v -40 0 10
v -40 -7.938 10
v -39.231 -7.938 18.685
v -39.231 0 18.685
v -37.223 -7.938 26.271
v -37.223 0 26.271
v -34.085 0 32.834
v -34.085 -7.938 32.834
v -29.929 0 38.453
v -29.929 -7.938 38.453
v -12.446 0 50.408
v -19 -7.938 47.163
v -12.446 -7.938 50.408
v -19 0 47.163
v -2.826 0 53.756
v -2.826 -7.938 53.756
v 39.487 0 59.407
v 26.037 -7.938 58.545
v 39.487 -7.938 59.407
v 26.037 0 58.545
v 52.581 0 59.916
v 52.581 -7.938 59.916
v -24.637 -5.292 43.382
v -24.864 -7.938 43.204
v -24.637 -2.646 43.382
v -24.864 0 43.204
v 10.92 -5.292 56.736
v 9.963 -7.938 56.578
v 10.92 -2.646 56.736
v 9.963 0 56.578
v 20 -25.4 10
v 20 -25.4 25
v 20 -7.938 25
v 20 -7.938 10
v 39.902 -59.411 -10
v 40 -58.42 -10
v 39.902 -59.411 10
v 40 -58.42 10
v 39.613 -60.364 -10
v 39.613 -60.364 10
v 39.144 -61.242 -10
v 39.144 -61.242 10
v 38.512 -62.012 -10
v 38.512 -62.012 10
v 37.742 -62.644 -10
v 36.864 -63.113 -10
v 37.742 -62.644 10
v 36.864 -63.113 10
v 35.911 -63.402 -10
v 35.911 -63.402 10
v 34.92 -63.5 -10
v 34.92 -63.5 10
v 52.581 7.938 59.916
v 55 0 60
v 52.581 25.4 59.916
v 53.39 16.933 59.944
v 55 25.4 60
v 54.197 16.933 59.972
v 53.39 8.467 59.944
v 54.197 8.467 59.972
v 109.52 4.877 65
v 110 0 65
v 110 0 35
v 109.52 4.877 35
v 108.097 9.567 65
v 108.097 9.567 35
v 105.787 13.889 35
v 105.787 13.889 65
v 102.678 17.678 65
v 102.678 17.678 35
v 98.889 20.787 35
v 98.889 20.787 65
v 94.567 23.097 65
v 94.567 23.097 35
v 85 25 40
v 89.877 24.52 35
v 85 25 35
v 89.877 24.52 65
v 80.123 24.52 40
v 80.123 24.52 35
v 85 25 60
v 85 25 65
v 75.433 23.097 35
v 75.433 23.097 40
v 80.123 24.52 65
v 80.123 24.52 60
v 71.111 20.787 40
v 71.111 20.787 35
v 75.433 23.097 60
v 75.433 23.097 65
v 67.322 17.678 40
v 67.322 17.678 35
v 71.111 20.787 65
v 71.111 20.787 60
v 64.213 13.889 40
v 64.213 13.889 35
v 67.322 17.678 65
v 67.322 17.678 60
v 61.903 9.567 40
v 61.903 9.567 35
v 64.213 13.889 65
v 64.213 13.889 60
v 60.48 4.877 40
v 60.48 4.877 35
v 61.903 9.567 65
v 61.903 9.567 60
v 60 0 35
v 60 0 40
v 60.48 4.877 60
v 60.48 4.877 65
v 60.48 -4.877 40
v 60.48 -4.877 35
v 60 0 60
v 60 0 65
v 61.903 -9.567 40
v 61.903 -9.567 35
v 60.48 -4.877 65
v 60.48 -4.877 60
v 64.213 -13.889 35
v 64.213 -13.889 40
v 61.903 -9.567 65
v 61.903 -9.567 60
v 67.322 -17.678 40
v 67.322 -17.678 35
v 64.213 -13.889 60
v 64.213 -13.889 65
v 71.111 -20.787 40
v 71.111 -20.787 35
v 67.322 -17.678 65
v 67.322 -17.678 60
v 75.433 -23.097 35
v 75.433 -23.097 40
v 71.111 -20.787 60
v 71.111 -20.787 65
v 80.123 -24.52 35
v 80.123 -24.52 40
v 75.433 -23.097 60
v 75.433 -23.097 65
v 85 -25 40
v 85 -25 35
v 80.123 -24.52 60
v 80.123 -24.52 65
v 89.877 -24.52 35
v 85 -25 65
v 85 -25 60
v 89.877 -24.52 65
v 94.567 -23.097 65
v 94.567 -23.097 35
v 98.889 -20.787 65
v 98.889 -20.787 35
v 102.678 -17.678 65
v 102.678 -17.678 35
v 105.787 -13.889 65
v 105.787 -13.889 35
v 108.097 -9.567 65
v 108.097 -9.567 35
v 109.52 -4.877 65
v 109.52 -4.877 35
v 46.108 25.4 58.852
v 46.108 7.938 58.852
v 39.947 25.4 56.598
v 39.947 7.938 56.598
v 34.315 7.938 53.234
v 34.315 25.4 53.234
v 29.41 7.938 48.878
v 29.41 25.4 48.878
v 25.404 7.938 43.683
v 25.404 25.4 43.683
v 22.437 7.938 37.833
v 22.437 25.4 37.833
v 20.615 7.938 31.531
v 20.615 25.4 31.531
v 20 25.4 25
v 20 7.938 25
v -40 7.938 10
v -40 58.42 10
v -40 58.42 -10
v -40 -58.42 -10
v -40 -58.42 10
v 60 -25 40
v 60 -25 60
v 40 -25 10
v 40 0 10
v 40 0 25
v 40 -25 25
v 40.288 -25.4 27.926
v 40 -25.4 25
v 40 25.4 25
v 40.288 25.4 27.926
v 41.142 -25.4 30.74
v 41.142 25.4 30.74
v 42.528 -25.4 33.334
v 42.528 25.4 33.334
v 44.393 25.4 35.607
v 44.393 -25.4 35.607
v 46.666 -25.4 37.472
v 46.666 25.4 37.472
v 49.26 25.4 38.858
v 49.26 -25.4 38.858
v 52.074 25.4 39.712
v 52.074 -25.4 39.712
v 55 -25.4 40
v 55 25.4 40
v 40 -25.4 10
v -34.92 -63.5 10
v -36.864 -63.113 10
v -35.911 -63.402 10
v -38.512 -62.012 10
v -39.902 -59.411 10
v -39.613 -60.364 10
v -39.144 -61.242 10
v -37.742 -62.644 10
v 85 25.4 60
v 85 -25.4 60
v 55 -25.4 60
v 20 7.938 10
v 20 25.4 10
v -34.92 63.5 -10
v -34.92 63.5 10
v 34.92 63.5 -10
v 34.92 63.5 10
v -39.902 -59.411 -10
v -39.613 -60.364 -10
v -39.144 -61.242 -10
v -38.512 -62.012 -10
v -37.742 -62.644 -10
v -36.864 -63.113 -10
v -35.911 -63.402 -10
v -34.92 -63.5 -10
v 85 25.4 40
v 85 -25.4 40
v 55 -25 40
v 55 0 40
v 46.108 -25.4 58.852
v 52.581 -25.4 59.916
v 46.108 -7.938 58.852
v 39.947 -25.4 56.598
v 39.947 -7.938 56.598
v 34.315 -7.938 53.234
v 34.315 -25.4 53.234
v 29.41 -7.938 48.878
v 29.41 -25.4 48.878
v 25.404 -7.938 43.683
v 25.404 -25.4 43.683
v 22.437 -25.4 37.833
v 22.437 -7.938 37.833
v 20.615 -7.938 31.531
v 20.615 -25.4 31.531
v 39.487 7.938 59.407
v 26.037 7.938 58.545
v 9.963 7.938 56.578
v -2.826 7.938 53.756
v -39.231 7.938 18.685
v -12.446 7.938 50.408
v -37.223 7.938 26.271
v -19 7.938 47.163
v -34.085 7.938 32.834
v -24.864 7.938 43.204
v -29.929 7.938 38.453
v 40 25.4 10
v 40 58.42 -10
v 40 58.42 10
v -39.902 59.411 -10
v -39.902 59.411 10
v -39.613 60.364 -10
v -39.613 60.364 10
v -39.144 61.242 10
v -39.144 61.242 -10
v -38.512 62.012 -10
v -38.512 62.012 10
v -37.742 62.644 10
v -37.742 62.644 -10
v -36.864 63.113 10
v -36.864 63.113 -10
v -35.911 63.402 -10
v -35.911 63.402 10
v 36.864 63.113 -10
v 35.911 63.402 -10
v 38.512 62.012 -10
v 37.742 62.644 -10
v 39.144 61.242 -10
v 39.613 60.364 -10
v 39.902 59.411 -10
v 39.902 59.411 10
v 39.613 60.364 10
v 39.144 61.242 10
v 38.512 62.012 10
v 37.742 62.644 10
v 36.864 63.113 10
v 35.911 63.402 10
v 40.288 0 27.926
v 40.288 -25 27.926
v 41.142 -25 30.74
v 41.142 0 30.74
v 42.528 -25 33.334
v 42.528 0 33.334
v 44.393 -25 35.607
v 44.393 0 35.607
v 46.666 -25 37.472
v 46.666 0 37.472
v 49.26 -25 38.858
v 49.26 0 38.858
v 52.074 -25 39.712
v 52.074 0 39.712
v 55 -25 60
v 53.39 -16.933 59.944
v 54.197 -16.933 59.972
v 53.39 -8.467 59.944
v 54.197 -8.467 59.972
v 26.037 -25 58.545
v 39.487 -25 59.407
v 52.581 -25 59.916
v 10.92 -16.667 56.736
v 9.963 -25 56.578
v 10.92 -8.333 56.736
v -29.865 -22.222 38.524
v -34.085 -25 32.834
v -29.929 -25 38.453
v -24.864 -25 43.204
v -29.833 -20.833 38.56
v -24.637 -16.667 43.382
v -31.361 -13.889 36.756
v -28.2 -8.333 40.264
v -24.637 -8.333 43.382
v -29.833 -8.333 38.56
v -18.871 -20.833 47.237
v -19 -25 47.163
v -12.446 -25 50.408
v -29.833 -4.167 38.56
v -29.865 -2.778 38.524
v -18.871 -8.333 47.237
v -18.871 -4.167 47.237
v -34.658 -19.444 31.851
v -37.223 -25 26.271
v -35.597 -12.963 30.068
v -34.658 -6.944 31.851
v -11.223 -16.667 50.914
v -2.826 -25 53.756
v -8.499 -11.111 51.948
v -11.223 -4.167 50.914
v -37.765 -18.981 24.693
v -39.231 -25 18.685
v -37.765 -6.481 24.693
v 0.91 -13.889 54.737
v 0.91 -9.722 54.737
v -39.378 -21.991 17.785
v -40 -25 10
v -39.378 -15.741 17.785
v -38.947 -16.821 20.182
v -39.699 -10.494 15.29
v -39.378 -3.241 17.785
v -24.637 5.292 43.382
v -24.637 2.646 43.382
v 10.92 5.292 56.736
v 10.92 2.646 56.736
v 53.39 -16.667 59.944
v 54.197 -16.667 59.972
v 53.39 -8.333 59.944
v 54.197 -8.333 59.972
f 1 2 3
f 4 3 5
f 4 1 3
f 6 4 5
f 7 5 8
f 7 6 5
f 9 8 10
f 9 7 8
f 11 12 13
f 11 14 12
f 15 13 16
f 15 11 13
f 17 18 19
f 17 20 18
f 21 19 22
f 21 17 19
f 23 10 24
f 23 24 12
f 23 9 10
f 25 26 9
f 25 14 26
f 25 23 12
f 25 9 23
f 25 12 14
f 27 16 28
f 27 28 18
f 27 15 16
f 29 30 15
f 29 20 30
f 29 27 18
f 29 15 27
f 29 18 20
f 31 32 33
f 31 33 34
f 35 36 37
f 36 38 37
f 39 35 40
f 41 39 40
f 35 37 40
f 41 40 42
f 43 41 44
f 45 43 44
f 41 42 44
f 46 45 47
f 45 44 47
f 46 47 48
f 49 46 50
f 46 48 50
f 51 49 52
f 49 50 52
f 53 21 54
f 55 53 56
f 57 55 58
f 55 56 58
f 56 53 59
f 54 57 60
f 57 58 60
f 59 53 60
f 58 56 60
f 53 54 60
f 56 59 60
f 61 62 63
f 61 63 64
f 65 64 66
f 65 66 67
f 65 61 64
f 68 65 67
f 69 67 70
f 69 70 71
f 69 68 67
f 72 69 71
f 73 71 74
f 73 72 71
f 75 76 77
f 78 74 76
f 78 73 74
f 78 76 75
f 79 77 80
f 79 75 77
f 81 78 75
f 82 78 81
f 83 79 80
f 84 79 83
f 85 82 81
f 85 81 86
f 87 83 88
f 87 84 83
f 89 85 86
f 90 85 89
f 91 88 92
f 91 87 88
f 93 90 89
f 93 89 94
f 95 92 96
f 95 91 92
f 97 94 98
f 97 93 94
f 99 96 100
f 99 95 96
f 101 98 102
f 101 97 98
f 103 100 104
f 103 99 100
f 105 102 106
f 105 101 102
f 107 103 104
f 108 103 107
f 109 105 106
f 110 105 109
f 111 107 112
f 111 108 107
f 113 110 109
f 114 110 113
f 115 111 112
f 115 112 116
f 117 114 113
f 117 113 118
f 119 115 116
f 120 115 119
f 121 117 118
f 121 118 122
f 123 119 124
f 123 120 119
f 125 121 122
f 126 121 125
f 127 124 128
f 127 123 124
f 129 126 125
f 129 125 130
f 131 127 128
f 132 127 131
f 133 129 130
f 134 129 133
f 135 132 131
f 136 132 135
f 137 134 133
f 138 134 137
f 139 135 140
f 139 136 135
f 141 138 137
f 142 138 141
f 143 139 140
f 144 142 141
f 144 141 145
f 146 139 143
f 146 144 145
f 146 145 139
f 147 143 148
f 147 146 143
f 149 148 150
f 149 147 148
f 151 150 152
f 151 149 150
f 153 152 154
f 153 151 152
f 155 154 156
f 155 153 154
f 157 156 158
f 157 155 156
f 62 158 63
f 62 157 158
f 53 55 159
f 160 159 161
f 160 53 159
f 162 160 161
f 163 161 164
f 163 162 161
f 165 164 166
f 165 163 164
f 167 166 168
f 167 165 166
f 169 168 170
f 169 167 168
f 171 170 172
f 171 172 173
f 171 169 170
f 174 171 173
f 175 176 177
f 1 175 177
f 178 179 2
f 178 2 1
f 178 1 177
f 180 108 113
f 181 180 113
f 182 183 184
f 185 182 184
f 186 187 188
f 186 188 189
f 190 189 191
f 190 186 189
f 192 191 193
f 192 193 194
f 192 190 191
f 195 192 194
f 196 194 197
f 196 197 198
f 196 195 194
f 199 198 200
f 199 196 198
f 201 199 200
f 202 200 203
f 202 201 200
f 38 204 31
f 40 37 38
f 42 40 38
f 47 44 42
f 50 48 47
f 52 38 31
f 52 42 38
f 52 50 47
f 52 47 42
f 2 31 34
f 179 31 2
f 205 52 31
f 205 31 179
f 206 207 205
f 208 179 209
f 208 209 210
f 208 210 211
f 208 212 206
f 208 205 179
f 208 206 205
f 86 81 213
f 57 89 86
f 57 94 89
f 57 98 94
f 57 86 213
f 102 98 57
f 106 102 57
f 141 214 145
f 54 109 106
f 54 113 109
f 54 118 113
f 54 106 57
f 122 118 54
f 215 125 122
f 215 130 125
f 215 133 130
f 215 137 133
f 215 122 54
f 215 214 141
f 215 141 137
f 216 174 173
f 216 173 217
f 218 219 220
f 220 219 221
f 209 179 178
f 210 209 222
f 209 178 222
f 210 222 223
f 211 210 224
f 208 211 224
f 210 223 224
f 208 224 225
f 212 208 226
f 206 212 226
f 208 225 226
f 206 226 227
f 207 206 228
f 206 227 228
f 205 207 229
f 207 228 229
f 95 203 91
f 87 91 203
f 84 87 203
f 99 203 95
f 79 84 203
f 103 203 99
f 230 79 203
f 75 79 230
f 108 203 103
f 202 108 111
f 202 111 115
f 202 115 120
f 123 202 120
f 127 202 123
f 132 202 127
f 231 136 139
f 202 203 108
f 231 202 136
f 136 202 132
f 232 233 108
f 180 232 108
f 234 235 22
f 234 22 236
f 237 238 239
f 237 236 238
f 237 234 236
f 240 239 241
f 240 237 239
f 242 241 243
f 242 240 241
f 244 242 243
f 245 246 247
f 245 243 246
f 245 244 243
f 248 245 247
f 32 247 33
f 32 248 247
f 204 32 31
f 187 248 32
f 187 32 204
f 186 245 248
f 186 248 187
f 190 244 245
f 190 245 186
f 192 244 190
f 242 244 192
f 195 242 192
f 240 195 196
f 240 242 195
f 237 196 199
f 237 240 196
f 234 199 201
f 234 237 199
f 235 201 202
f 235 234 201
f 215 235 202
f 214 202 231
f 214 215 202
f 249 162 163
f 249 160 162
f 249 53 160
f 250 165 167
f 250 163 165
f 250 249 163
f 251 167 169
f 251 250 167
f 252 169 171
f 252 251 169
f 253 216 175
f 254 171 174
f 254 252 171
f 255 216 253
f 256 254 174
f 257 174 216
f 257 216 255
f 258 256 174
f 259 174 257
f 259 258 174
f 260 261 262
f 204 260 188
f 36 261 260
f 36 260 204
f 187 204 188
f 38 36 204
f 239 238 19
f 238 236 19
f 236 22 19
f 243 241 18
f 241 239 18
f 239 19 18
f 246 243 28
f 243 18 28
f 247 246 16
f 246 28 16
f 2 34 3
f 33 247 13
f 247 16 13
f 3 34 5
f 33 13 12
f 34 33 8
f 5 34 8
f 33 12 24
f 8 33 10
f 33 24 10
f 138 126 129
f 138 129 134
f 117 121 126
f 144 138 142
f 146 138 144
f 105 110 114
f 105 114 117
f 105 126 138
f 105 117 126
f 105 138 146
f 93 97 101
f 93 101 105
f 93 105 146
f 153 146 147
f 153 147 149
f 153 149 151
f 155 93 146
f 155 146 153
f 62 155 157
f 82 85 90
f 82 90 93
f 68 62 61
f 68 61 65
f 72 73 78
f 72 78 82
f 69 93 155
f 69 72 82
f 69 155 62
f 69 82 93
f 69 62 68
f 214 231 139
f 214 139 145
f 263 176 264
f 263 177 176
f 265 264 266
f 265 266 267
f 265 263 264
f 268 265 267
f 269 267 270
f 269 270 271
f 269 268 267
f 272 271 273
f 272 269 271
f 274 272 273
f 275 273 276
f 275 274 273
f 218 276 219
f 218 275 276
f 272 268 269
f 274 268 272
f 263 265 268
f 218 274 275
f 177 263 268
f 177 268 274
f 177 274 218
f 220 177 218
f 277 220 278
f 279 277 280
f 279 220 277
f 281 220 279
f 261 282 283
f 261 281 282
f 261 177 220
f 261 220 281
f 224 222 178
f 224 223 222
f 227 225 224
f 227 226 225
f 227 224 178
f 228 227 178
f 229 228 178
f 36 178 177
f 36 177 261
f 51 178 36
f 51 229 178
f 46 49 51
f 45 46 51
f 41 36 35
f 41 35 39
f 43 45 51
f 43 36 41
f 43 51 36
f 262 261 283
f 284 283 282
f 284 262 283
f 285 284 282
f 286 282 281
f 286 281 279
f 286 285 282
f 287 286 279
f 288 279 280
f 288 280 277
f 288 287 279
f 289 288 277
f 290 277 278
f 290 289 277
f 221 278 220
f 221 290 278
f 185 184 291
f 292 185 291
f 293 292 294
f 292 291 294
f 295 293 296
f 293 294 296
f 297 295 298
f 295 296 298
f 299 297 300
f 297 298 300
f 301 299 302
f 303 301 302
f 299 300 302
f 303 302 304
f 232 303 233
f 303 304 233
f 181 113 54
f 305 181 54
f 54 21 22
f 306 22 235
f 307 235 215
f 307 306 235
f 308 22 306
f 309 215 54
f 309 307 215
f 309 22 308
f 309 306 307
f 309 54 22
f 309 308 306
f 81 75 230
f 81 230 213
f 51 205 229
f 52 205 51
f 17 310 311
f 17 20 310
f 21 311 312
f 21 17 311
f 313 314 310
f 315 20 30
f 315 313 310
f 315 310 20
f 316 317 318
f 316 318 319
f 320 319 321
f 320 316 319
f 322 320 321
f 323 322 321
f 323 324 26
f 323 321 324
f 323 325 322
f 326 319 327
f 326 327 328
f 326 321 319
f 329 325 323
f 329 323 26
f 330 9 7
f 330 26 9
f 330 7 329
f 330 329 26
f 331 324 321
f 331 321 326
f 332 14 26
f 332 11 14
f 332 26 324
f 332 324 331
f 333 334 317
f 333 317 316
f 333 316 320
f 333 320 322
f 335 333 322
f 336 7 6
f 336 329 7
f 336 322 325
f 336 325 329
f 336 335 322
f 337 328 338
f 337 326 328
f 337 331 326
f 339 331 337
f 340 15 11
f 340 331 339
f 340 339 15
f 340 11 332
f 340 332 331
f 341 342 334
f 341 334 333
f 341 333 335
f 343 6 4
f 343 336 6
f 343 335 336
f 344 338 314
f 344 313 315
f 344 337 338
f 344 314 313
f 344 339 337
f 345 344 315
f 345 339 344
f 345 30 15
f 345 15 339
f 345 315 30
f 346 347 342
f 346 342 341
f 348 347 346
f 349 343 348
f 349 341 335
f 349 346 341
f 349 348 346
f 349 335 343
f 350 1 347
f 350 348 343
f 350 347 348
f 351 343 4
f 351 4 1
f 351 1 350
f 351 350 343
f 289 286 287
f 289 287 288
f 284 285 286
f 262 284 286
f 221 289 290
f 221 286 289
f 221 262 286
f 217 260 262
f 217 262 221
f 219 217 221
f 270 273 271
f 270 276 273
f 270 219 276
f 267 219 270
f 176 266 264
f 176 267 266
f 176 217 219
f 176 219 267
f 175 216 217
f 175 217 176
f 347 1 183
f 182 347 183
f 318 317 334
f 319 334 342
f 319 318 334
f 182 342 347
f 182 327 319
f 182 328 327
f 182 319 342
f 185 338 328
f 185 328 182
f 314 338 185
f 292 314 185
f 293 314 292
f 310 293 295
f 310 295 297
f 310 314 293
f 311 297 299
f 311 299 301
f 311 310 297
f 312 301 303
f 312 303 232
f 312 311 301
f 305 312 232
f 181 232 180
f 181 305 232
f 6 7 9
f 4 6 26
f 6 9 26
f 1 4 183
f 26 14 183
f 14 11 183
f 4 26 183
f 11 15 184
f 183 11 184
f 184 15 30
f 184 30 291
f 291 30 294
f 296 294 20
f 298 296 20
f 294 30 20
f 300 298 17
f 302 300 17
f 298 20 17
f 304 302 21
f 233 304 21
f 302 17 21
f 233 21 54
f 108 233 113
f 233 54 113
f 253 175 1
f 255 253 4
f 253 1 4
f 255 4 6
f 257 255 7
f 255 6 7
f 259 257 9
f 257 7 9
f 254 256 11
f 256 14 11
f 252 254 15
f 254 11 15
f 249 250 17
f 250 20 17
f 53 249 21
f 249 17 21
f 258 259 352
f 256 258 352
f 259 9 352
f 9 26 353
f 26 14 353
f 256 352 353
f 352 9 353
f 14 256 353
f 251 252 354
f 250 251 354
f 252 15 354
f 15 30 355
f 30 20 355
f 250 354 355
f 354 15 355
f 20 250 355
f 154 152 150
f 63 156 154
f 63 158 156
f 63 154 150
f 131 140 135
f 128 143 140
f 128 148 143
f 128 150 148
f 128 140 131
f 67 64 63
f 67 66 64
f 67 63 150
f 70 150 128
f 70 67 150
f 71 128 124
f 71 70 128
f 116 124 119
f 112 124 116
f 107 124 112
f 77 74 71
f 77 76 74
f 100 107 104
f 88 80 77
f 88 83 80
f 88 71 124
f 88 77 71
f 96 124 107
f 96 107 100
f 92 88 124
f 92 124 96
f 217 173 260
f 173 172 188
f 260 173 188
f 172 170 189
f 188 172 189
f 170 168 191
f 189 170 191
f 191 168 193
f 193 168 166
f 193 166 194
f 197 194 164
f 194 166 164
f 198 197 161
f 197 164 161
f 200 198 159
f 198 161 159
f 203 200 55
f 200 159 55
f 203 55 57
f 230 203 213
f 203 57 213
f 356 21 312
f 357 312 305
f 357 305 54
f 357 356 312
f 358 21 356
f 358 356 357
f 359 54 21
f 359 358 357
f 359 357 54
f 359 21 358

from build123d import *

# Parameters (mm, degrees)
F1_DEPTH = 63.5
F0_W     = 25
F0_H     = 20
F2_DEPTH = 25.4
F3_DEPTH = 7.9375
F5_R     = 5.08
F6_DEPTH = 25


with BuildPart() as f1:
    # F0 (on Front) → F1 (new body, symmetric)
    with BuildSketch(Plane.XZ):
        Polygon((20, 10), (-40, 10), (-40, -10), (40, -10), (40, 10), align=None)
    extrude(amount=F1_DEPTH, both=True)

    # F0 (on Front) → F2 (join, symmetric)
    with BuildSketch(Plane.XZ):
        with BuildLine():
            Line((20, 25), (20, 10))
            Line((20, 10), (40, 10))
            Line((40, 10), (40, 25))
            ThreePointArc((40, 25), (44.393398, 35.606602), (55, 40))
            Line((55, 40), (60, 40))
            Line((60, 40), (60, 60))
            Line((60, 60), (55, 60))
            add(Edge.make_bspline(
                [(52.580514, 59.916273), (53.392113, 59.944254), (54.198785, 59.972039), (55, 60)],
                knots=[105.220482, 105.220482, 105.220482, 105.220482, 107.354553, 107.354553, 107.354553, 107.354553], degree=3))
            ThreePointArc((52.580514, 59.916273), (29.410139, 48.878002), (20, 25))
        make_face()
        with Locations((72.5, 50)):
            Rectangle(F0_W, F0_H)
    extrude(amount=F2_DEPTH, both=True)

    # F0 (on Front) → F3 (join, symmetric)
    with BuildSketch(Plane.XZ):
        with BuildLine():
            add(Edge.make_bspline(
                [(-40, 10), (-39.429734, 56.682558), (12.564579, 58.536668), (52.580514, 59.916273)],
                knots=[0, 0, 0, 0, 105.220482, 105.220482, 105.220482, 105.220482], degree=3))
            Line((-40, 10), (20, 10))
            Line((20, 10), (20, 25))
            ThreePointArc((20, 25), (29.410139, 48.878002), (52.580514, 59.916273))
        make_face()
    extrude(amount=F3_DEPTH, both=True)

    # F0 (on Front) → F4 (revolve)
    with BuildSketch(Plane.XZ):
        Polygon((85, 65), (85, 60), (85, 40), (85, 35), (110, 35), (110, 65), align=None)
    revolve(axis=Axis((85, 0, 50), (0, 0, 1)))

    # F5
    f5_edges = [f1.edges().sort_by_distance(p)[0] for p in [
        (40, -63.5, 0),
        (-40, -63.5, 0),
        (40, 63.5, 0),
        (-40, 63.5, 0),
    ]]
    fillet(f5_edges, radius=F5_R)


with BuildPart() as f6:
    # F0 (on Front) → F6 (new body)
    with BuildSketch(Plane.XZ):
        with BuildLine():
            Line((20, 25), (20, 10))
            Line((20, 10), (40, 10))
            Line((40, 10), (40, 25))
            ThreePointArc((40, 25), (44.393398, 35.606602), (55, 40))
            Line((55, 40), (60, 40))
            Line((60, 40), (60, 60))
            Line((60, 60), (55, 60))
            add(Edge.make_bspline(
                [(52.580514, 59.916273), (53.392113, 59.944254), (54.198785, 59.972039), (55, 60)],
                knots=[105.220482, 105.220482, 105.220482, 105.220482, 107.354553, 107.354553, 107.354553, 107.354553], degree=3))
            ThreePointArc((52.580514, 59.916273), (29.410139, 48.878002), (20, 25))
        make_face()
        with BuildLine():
            add(Edge.make_bspline(
                [(-40, 10), (-39.429734, 56.682558), (12.564579, 58.536668), (52.580514, 59.916273)],
                knots=[0, 0, 0, 0, 105.220482, 105.220482, 105.220482, 105.220482], degree=3))
            Line((-40, 10), (20, 10))
            Line((20, 10), (20, 25))
            ThreePointArc((20, 25), (29.410139, 48.878002), (52.580514, 59.916273))
        make_face()
    extrude(amount=F6_DEPTH)


solid = Compound([f1.part, f6.part])
